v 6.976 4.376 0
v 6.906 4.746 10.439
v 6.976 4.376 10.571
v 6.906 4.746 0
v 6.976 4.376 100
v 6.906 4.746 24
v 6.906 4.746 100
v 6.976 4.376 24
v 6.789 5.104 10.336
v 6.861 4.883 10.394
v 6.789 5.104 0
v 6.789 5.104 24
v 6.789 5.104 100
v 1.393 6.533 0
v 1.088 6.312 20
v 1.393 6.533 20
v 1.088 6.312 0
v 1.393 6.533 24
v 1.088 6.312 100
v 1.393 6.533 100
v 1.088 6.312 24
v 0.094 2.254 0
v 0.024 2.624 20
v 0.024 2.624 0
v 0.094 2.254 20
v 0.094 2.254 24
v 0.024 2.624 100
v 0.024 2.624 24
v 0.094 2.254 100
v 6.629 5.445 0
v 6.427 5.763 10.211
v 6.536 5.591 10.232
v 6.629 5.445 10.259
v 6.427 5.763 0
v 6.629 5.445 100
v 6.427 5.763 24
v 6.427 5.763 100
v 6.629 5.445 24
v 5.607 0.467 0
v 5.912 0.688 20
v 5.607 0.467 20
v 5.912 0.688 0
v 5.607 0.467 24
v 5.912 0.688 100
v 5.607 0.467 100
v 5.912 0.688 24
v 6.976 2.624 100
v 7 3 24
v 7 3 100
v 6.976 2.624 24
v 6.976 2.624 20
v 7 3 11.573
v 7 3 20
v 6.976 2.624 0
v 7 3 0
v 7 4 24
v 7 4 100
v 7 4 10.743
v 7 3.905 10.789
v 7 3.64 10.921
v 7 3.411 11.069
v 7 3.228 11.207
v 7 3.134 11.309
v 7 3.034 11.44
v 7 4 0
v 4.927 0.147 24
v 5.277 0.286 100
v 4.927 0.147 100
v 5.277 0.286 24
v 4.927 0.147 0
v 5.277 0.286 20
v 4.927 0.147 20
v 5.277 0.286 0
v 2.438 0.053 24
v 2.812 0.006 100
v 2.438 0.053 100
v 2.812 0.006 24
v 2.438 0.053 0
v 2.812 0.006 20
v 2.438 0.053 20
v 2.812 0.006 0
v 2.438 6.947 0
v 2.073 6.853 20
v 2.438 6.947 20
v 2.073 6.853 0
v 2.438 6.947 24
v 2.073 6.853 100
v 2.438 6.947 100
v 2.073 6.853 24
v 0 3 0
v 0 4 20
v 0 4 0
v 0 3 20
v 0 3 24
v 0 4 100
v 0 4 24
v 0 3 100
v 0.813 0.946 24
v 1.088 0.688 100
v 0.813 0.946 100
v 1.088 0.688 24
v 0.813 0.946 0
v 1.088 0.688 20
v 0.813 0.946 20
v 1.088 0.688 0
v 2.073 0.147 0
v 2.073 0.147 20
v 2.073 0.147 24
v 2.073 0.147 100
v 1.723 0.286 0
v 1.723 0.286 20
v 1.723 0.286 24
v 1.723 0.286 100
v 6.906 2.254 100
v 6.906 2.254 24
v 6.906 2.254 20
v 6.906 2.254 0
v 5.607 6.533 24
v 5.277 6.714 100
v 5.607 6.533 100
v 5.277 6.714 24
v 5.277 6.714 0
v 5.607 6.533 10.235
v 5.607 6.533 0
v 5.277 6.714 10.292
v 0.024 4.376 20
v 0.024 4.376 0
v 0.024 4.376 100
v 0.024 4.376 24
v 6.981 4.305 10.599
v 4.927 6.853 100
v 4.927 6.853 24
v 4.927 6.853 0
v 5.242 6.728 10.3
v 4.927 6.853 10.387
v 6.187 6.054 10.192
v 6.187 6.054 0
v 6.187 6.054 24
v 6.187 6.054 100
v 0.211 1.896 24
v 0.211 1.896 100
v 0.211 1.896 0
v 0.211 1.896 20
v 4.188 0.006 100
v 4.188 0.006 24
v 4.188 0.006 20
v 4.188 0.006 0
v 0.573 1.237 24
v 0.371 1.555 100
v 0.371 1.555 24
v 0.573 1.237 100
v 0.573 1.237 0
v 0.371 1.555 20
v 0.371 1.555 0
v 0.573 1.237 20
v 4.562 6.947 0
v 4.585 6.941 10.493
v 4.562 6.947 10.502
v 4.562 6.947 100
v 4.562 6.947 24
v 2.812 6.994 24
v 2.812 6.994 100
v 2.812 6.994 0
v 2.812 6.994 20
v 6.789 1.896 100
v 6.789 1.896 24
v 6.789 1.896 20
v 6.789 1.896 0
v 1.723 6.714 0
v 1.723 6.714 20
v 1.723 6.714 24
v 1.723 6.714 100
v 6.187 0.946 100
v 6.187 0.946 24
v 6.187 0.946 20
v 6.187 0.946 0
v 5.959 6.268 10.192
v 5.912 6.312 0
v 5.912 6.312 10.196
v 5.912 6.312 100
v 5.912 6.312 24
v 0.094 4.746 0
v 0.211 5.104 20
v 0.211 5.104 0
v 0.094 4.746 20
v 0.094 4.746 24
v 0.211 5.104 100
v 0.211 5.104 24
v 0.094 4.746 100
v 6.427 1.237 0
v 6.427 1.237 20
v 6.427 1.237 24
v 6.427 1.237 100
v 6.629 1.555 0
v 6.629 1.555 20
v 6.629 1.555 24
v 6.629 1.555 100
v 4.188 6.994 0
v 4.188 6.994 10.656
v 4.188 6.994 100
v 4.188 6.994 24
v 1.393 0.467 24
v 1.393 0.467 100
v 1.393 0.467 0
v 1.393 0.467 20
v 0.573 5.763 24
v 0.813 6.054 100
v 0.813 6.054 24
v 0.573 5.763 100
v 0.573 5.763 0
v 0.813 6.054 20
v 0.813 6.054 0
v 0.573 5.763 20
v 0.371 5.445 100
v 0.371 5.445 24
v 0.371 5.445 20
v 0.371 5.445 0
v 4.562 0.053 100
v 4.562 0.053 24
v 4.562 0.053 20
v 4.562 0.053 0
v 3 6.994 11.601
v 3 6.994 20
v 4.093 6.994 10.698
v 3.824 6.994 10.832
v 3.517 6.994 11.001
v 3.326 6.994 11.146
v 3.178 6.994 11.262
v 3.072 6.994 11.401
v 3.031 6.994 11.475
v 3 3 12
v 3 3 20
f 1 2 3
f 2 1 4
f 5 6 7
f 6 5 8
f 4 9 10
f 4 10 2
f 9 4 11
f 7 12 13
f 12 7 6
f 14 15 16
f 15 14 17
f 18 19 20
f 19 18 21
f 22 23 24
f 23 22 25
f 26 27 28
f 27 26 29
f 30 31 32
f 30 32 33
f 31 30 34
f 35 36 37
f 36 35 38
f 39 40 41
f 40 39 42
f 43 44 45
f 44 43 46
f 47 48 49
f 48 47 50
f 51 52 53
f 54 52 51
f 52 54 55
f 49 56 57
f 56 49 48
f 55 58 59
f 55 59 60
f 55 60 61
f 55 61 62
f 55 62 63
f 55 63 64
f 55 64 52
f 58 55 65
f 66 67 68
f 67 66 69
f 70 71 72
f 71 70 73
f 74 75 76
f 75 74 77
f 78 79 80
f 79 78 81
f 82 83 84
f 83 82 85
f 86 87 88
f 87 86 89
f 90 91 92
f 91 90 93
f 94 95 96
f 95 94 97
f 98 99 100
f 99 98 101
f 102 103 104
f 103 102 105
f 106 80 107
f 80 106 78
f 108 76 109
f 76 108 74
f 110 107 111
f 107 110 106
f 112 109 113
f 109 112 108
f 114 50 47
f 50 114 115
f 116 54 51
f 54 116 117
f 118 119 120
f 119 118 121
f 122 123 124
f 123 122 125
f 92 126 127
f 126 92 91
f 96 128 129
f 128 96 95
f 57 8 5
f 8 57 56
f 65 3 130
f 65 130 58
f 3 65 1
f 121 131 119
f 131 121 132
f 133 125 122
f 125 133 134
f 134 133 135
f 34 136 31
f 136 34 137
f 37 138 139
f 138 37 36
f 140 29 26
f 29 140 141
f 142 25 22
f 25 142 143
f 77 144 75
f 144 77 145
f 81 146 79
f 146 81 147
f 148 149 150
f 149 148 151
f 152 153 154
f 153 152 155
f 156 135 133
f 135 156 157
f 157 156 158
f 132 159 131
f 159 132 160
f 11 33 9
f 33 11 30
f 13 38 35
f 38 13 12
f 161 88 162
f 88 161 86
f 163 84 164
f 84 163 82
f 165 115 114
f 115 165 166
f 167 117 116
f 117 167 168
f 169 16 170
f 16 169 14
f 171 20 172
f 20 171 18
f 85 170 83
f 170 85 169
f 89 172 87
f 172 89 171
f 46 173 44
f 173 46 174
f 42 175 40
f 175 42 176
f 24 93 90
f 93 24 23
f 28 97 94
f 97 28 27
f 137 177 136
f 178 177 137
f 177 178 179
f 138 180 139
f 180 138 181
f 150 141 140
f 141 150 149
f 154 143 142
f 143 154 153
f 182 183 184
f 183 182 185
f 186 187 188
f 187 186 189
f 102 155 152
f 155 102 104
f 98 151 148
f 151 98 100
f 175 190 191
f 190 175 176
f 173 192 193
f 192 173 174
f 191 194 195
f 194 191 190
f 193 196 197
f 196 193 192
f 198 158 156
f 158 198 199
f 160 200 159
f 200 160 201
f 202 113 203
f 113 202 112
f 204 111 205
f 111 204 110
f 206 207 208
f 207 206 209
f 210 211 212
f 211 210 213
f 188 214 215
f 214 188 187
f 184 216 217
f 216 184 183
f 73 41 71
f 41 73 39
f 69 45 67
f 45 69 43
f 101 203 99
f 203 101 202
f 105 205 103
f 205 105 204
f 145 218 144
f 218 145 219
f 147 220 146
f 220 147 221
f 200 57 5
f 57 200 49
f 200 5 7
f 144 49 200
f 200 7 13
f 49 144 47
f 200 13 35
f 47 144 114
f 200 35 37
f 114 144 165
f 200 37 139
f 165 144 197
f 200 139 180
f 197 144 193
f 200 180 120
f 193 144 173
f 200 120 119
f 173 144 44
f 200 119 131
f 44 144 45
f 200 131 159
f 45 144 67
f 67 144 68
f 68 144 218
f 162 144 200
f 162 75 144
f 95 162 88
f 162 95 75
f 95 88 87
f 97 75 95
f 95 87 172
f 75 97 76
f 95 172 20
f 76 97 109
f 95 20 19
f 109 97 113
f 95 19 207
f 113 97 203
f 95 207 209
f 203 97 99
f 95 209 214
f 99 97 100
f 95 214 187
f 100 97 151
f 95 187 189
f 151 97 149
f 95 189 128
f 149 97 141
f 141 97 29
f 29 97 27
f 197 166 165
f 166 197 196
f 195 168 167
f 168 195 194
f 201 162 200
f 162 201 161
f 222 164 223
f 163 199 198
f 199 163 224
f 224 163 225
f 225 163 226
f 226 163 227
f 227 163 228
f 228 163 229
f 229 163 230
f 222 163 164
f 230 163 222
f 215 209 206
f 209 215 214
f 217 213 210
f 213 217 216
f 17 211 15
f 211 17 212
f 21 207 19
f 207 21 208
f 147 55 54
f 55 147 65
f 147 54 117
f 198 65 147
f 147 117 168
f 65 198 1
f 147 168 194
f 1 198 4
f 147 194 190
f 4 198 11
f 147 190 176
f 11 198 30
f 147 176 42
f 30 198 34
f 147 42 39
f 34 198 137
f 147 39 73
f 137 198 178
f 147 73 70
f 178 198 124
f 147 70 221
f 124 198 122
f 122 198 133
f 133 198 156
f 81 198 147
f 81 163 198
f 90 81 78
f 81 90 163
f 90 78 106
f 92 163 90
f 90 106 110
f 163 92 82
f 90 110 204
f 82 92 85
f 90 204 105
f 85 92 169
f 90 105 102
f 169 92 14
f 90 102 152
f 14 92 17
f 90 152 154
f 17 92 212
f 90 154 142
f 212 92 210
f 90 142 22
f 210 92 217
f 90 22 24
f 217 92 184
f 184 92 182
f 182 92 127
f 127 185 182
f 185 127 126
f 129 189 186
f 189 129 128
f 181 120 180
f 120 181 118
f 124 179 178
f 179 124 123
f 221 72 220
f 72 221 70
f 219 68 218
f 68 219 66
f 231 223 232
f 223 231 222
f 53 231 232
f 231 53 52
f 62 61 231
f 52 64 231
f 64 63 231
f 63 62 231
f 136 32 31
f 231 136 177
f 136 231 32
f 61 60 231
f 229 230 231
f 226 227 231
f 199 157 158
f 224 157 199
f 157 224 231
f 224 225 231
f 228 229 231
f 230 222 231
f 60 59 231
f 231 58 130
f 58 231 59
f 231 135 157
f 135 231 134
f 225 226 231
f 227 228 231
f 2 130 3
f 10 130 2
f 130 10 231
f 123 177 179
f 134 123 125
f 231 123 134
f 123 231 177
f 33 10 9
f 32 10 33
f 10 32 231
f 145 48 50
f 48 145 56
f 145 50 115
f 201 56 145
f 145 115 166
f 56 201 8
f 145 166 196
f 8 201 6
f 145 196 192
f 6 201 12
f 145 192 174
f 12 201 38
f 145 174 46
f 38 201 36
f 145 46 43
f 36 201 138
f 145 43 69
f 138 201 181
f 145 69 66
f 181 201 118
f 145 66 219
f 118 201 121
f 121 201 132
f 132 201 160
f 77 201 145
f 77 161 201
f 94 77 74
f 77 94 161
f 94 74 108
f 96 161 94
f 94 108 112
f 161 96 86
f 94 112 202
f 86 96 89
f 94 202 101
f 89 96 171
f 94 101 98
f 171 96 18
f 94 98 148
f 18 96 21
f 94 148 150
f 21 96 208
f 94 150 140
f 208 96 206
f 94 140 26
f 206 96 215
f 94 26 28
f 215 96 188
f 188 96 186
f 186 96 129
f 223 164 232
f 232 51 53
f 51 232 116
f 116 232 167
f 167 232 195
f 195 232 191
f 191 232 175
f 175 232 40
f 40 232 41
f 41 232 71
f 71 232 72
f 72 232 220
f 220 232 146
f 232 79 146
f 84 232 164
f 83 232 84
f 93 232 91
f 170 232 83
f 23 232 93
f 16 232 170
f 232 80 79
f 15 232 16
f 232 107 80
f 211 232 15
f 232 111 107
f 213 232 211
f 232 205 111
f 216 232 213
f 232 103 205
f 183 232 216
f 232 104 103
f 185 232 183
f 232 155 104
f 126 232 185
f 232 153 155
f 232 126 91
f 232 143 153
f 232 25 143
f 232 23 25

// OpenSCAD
// file: ../../lib/rounded_square.scad
$bleed = 1;
$rounding = 3;

module rounded_square(size) {
  inner_size = [
    size[0] - $rounding * 2,
    size[1] - $rounding * 2,
  ];

  minkowski() {
    translate([$rounding, $rounding, 0]) {
      square(inner_size);
    }
    circle($rounding);
  }
}
// file: ../../lib/util_functions.scad
function sum(v) = [for(p = v) 1] * v;

function take_sum(v, i) = i == 0 
  ? 0 
  : sum([for (a = [0:i-1]) v[a]]);

// input : nested list
// output : list with the outer level nesting removed
function flatten(l) = [ for (a = l) for (b = a) b ] ;
// file: ../../lib/rounded_cube.scad
include <./rounded_square.scad>

$bleed = 1;
$rounding = 3;

// Render a rounded cube
// flat_top: do not round the top edges
// flat_bottom: do not round the bottom edges
// flat: equals flat_top && flat_bottom
// 
// Limitations:
// requires height > $rounding * 2
// flat_top || flat_bottom requires height > $rounding
// flat_top && flat_bottom requires height > $bleed
module rounded_cube(
  size, 
  flat=false, 
  flat_top=false, 
  flat_bottom=false,
  side_rounding=-1
) {
  _flat = flat || (flat_top && flat_bottom);
  _flat_top = flat_top || flat;
  _flat_bottom = flat_bottom || flat;
  _rounding = min($rounding, size[2] / 2);
  _side_rounding = side_rounding > -1 ? side_rounding: $rounding;

  assert(_side_rounding >= $rounding, "side rounding cannot be less than rounding");

  top_height = _flat_top ? 0: _rounding;
  bottom_height = _flat_bottom ? 0: _rounding;

  cube_size = [
    size[0] - _rounding * 2,
    size[1] - _rounding * 2,
    size[2] - (top_height + bottom_height)
  ];

  if (_flat_top && _flat_bottom) {
     linear_extrude(cube_size[2]) {
       rounded_square([size[0], size[1]]);
     }
  } else {
    minkowski() {
      translate([_rounding, _rounding, bottom_height]) {
        if (_side_rounding != _rounding) {
          linear_extrude(cube_size[2]) {
            rounded_square([cube_size[0], cube_size[1]], $rounding=_side_rounding);
          }
        } else {
          cube(cube_size);
        }
      }

      if (_flat_top) {
        difference() {
          sphere(_rounding);
          cylinder(_rounding, _rounding, _rounding);
        }
      } else if (_flat_bottom) {
        difference() {
          sphere(_rounding);
          translate ([0, 0, -_rounding]) {
            cylinder(_rounding, _rounding, _rounding);
          }
        }
      } else {
        sphere(_rounding);
      }
    }
  }
}
// file: ../../lib/grid_dish.scad
include <./dish.scad>
include <./grid_layout.scad>

module grid_dish(grid, pos) {
  translate(grid_offset(grid, pos)) {
    dish(grid_size(grid, pos));
  }
}
// file: ../../lib/dish.scad
include <./rounded_cube.scad>

$rounding = 3;
$bleed = 1;
$lid_height = 2;

default_dish_ratio = 0.5;

module dish (size, dish_ratio=default_dish_ratio, lid=false) {
  width = size[0];
  length = size[1];
  height = size[2];

  r_width = width - $rounding * 2;
  r_length = length - $rounding * 2;
  r_height = height - $rounding * 2;
  cube_ratio = 1 - dish_ratio;

  radius = min(r_width,r_length);

  position = [
    0,
    0,
    lid ? -$lid_height : 0,
  ];

  translate(position) {
    // difference() {
      translate([$rounding,$rounding,$rounding]) {
        // minkowski() {
          hull() {
            translate([0,0,height * dish_ratio - $rounding]) {
              cube([r_width,r_length,height * cube_ratio]);
            }
            translate([r_width/2,r_length/2,height * dish_ratio / 2]) {
              resize([r_width,r_length,height * dish_ratio]) {
                sphere(radius);
              }
            }
          }
          // sphere($rounding);
        // }
      }

      translate([-$bleed,-$bleed,height]) {
        /*
        cube([
          width + $bleed * 2,
          length + $bleed * 2,
          $rounding + $bleed
        ]);
        */
      }
    }
  // }
}
// file: ../../lib/grid_layout.scad
include <./util_functions.scad>

$wall_thickness = 2;

function total_wall_size(count = 1) = (count + 1) * $wall_thickness;

function usable_size(size, count = 1) = size - total_wall_size(count);

function item_size(size, count = 1, i = 0) = usable_size(size, count) / count;

function axis_offset(v, i) = take_sum(v, i) + $wall_thickness * i;

// Get the offset to place the item at the given grid position
function grid_offset(grid, pos) = [
  axis_offset(grid[0], pos[0] ? pos[0] : 0), 
  axis_offset(grid[1], pos[1] ? pos[1] : 0), 
  axis_offset(grid[2], pos[2] ? pos[2] : 0), 
];

// Get the size of the item at given grid position
function grid_size(grid, pos) = [
  grid[0][pos[0] ? pos[0]: 0],
  grid[1][pos[1] ? pos[1]: 0],
  grid[2][pos[2] ? pos[2]: 0],
];

// Make an evenly split grid
function make_even_grid(size, cols, rows) = [
  [for (i=[0:cols-1]) item_size(size[0], cols)],
  [for (i=[0:rows-1]) item_size(size[1], rows)],
  [size[2]],
];

// TODO items that take 100% of an axis wont ever have a value
// totally unable to handle differing rows / columns
// revert to lower level functions for manual placements
// file: ../../lib/cutout_tray.scad
include <./rounded_cube.scad>

$bleed = 1;
$rounding = 3;
$wall_thickness = 2;

module cutout_tray(size) {
  width = size[0];
  length = size[1];
  height = size[2];

  difference() {
    // Base tray
    rounded_cube(width, length, height+$rounding+$bleed);

    // Cutouts
    translate([0, 0, $wall_thickness]) {
      children();
    }
 
    // Slice off top
    translate([-$bleed,-$bleed,height]) {
      cube([
        width + $bleed * 2, 
        length + $bleed * 2, 
        $rounding + $bleed
      ]);
    }
  }
}
// main file
echo(version=version());

include <../../lib/cutout_tray.scad>
include <../../lib/grid_layout.scad>
include <../../lib/dish.scad>
include <../../lib/grid_dish.scad>

// Config
$fn = 50;
$wall_thickness = 2;

// Attributes

size = [
  50,
  50,
  20
];

grid = make_even_grid(size, 1, 1);

// Model

cutout_tray(size) {
  grid_dish(grid, [0, 0]);
}
